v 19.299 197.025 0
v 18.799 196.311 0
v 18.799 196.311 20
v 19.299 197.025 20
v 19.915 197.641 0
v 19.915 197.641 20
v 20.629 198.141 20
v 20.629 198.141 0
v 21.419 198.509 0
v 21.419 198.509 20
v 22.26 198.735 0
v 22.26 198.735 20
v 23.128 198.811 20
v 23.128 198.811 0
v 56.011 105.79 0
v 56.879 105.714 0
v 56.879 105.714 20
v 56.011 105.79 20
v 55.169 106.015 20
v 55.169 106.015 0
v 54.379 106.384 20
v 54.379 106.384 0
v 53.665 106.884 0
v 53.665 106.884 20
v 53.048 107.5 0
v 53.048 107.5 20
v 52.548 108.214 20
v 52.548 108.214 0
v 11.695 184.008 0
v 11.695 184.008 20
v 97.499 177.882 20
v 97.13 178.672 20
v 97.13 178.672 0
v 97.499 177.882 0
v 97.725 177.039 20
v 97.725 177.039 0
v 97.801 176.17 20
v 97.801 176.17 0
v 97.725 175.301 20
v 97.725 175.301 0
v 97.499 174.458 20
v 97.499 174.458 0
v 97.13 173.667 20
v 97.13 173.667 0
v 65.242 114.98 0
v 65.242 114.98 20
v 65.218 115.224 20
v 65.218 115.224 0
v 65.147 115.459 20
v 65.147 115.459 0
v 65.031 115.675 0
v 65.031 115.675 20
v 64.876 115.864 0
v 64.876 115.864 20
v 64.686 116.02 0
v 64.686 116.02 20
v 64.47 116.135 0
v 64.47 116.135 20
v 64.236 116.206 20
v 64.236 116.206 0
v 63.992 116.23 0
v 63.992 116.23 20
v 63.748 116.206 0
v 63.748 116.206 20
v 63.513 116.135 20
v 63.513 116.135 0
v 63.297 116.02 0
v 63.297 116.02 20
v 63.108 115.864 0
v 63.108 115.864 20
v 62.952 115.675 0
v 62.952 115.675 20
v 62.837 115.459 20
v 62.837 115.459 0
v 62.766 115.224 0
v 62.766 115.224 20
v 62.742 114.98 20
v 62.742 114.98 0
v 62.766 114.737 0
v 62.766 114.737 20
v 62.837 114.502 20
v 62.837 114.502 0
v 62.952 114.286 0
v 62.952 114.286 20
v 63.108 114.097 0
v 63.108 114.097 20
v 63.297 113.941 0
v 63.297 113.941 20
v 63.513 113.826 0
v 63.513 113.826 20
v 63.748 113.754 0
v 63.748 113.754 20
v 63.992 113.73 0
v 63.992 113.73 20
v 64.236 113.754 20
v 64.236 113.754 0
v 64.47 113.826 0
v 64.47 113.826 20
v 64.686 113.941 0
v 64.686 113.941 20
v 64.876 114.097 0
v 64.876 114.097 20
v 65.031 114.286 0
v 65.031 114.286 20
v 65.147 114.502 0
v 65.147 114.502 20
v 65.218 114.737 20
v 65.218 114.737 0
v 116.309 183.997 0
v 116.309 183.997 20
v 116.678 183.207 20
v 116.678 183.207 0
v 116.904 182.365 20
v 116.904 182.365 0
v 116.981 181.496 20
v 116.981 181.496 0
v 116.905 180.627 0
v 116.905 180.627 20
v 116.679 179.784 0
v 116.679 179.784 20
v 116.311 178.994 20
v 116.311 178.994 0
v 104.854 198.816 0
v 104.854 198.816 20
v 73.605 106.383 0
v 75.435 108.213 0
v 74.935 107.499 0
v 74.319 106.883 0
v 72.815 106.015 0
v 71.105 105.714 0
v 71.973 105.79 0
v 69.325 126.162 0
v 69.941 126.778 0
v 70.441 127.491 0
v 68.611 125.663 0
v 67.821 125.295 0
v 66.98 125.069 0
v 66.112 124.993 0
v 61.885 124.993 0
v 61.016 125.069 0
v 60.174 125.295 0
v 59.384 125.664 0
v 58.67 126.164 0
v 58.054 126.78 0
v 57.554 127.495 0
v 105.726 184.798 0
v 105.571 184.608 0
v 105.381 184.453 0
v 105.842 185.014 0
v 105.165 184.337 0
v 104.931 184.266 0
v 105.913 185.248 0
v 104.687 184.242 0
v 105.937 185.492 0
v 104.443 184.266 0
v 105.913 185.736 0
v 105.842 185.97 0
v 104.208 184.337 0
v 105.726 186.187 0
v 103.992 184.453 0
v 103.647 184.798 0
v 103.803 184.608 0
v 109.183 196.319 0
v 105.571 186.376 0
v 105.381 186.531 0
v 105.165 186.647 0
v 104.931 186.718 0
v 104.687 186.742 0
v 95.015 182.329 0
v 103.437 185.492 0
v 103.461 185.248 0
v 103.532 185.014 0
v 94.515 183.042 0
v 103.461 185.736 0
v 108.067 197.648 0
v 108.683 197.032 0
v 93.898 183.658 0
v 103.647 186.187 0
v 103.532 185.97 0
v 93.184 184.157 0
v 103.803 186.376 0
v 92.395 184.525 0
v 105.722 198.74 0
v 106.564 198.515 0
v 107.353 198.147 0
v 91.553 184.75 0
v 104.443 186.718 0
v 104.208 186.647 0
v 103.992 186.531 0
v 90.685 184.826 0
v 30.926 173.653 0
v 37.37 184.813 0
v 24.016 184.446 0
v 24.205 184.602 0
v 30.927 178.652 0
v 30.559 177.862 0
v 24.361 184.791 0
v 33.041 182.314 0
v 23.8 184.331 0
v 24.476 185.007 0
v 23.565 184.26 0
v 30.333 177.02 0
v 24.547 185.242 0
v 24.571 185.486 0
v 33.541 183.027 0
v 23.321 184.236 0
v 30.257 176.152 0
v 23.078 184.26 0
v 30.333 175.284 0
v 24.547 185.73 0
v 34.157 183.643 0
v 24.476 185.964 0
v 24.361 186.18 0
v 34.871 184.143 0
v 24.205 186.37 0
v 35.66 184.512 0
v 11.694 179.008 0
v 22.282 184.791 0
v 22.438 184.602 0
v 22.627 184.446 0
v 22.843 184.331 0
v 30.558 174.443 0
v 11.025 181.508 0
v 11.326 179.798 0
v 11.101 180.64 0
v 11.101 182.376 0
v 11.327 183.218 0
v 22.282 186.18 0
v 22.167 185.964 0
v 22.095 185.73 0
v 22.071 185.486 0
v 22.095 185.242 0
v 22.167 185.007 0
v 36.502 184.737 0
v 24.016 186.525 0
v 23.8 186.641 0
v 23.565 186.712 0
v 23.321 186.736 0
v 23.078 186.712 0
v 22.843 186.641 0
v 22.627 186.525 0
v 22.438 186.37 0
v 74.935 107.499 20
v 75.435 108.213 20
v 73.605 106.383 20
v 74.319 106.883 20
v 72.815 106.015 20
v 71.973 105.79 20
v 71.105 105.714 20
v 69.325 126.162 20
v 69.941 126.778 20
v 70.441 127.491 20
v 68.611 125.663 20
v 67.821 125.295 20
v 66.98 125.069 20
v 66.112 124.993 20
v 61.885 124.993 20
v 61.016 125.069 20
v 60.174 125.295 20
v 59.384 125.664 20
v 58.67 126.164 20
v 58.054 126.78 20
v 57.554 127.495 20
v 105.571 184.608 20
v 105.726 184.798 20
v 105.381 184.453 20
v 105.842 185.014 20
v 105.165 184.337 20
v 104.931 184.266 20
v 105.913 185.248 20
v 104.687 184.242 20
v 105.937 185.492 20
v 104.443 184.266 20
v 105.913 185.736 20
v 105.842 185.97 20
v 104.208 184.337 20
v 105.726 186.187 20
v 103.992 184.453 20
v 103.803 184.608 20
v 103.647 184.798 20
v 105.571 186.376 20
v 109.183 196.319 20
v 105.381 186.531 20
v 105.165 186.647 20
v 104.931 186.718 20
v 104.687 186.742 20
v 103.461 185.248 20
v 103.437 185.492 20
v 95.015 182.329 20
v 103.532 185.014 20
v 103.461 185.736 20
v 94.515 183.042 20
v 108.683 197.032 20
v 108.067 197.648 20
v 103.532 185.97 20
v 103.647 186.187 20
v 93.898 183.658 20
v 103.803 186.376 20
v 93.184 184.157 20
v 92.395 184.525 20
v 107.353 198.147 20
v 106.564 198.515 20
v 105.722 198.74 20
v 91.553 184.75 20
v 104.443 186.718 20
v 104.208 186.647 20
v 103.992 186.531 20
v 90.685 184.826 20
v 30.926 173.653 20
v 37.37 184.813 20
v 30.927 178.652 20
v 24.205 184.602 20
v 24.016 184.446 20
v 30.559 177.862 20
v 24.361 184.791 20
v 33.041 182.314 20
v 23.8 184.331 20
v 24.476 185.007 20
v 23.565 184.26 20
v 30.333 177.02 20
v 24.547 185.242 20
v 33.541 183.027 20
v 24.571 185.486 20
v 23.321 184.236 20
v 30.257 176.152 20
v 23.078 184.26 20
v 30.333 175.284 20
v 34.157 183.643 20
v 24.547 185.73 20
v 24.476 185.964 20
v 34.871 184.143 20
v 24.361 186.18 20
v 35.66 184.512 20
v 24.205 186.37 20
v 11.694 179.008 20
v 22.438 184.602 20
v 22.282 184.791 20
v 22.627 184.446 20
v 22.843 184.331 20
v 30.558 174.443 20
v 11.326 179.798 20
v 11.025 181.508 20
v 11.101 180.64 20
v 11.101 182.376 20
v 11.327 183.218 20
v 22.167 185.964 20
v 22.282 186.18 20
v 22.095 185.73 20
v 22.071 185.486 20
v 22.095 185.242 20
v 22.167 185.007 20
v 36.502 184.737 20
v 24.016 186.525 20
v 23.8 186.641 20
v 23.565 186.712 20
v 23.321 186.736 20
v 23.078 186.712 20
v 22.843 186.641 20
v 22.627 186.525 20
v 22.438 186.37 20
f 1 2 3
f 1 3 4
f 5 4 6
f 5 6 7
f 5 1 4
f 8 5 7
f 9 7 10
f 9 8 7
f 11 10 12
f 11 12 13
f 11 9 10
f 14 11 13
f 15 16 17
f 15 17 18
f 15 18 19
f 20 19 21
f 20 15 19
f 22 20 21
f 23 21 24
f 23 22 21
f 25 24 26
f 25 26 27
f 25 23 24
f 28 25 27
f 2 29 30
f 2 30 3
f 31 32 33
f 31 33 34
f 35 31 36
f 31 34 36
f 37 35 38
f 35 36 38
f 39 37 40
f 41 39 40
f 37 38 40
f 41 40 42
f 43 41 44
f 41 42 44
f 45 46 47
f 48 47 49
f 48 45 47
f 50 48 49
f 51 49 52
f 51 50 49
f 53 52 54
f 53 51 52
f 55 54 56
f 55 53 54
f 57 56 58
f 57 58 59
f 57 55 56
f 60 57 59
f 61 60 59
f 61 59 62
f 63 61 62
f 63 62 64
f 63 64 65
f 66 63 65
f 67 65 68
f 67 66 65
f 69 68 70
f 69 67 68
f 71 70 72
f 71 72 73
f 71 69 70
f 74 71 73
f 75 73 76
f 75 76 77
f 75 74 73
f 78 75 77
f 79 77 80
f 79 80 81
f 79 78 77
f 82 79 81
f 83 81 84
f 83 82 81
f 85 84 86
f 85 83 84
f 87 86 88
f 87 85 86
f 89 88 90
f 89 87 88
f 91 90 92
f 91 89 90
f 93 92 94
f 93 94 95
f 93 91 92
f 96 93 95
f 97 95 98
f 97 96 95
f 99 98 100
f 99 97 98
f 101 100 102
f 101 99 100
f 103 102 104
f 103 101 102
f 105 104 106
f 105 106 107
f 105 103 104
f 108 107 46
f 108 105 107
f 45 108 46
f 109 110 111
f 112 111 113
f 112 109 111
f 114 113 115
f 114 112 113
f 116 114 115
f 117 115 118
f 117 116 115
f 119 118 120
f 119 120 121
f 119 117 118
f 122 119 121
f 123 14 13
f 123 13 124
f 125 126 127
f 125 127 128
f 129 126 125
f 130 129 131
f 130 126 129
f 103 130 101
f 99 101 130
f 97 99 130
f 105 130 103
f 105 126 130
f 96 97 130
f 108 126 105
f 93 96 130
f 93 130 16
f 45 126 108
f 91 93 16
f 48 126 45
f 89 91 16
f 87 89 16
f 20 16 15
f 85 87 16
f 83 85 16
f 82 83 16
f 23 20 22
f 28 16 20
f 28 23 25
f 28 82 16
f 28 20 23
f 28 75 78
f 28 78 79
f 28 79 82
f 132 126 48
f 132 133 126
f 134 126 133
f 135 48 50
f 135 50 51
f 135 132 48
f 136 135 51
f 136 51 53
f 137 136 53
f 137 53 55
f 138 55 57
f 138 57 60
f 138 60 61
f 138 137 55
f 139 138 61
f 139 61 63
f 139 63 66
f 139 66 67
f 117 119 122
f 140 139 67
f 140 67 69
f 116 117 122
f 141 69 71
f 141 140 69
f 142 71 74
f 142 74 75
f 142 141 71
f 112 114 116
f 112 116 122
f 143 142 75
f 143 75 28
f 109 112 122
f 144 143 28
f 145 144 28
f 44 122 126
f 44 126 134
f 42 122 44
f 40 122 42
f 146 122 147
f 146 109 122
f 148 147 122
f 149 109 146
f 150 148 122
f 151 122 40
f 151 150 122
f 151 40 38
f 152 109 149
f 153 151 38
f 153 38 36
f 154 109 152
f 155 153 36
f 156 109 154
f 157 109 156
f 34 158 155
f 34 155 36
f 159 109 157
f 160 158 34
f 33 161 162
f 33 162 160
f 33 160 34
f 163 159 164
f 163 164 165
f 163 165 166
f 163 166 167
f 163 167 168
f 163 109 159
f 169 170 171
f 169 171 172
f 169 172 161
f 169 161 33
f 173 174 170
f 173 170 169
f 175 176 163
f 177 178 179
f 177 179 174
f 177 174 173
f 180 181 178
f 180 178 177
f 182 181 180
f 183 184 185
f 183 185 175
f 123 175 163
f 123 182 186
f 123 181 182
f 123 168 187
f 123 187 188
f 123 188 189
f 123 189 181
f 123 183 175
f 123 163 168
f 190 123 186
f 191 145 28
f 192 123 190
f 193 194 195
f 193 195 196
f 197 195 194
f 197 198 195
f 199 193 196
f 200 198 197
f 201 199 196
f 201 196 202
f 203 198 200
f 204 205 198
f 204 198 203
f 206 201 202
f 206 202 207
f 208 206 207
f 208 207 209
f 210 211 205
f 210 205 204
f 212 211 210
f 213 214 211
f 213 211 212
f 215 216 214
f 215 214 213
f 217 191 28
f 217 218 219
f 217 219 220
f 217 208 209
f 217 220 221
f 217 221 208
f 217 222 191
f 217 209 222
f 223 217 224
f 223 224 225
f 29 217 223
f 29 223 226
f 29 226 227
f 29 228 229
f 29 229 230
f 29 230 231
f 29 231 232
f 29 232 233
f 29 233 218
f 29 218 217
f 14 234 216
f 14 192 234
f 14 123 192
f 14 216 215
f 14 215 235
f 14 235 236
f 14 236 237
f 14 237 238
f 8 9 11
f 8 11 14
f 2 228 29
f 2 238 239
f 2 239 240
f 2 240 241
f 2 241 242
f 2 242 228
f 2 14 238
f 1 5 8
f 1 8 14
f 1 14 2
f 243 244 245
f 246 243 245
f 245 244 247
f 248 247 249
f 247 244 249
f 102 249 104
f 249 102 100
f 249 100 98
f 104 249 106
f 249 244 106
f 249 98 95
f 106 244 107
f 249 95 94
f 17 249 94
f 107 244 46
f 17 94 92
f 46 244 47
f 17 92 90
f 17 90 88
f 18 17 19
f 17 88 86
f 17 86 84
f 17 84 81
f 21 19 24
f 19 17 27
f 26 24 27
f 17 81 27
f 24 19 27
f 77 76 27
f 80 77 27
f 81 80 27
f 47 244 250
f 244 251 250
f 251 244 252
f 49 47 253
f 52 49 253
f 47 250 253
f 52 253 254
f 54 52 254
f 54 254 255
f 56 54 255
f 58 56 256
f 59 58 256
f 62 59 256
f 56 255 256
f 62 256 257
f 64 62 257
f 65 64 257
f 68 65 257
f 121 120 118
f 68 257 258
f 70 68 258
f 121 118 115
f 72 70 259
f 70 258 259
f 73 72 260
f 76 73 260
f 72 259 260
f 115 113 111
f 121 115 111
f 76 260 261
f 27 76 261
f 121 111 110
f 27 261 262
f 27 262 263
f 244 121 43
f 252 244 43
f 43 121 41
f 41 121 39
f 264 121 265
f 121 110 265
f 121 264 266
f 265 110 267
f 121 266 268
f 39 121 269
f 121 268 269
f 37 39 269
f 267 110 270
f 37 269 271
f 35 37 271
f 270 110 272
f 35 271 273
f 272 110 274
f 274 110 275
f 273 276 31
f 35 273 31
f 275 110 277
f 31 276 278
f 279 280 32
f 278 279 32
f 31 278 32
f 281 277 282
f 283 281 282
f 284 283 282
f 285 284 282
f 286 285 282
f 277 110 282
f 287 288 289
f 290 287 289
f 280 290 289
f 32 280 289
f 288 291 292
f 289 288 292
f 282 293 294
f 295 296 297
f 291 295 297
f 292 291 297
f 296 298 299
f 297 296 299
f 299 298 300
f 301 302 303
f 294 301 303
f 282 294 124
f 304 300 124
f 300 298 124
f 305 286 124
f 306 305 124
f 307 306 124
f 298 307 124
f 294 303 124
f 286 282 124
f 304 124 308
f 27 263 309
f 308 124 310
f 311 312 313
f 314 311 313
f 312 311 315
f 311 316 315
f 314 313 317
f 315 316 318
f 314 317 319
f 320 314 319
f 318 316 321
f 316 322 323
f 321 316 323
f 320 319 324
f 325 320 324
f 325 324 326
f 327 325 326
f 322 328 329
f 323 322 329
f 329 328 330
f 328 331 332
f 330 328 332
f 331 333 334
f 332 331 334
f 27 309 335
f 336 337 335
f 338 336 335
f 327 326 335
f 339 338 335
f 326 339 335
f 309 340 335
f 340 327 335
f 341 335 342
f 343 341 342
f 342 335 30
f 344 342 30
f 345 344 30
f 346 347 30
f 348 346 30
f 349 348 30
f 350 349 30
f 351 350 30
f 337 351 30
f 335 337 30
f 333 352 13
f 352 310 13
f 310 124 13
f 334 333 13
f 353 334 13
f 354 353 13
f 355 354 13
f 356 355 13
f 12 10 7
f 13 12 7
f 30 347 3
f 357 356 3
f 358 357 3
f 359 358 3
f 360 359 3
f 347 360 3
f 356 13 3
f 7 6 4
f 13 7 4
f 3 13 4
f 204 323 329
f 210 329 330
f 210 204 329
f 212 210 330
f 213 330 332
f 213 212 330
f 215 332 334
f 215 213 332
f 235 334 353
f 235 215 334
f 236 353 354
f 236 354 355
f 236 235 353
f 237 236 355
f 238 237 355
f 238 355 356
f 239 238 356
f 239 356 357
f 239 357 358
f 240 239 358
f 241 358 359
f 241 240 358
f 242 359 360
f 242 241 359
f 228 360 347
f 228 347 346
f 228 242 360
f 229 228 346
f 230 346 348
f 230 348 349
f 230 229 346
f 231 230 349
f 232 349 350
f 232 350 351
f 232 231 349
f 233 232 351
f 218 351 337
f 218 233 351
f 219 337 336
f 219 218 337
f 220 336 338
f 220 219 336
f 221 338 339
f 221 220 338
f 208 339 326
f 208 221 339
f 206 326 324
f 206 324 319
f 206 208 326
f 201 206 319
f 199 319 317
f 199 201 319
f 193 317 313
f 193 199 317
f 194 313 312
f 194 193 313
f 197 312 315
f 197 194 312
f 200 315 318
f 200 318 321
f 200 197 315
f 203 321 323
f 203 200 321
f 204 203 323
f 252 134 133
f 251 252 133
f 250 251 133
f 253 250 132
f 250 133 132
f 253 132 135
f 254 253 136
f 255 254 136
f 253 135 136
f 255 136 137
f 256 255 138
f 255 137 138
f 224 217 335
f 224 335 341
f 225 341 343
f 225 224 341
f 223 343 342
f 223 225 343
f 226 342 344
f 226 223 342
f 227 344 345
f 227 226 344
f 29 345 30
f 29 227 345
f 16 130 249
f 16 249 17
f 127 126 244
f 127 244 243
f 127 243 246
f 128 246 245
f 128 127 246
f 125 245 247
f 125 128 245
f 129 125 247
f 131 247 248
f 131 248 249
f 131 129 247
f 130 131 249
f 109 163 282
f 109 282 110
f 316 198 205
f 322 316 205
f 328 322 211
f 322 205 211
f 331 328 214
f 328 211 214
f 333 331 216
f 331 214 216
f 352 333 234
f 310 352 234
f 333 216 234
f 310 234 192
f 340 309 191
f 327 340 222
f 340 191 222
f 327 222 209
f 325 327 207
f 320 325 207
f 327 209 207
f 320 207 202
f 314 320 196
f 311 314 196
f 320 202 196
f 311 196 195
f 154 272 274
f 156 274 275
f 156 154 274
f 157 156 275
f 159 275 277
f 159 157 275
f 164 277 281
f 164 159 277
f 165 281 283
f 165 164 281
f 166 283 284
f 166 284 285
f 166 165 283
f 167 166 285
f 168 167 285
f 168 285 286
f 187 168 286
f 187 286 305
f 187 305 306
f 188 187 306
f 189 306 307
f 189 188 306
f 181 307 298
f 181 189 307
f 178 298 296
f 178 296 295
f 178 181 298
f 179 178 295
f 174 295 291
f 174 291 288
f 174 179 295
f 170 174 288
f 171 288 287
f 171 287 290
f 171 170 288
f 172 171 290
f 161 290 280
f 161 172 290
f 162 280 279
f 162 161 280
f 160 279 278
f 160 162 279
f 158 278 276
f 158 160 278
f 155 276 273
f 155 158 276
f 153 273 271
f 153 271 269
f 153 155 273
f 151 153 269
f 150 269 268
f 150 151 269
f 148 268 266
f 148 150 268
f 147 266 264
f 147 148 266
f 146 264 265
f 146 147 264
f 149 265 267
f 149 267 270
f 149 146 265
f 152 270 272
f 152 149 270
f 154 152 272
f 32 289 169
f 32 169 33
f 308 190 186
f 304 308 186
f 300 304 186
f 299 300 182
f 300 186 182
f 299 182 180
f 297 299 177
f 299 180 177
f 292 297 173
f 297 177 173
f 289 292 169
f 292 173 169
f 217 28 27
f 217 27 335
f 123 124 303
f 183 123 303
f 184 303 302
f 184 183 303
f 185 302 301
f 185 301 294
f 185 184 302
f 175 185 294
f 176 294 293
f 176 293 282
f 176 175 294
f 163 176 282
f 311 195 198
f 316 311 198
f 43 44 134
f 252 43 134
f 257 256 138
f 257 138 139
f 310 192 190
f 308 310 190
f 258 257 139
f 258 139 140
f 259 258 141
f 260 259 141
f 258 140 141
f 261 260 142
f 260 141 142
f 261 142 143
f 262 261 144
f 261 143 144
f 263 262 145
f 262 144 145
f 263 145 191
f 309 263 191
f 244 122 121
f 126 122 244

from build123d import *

# Parameters (mm, degrees)
MODEL_R                  = 1.25
RESSALTO_EXTRUS_O1_DEPTH = 20


with BuildPart() as part:
    # Model → Ressalto-extrusão1 (new body)
    with BuildSketch(Plane.XY):
        with BuildLine():
            Line((11.694931393, 184.007671687), (18.798816999, 196.310732401))
            ThreePointArc((18.798816999, 196.310732401), (20.628779754, 198.140639612), (23.128489927, 198.81054493))
            Line((23.128489927, 198.81054493), (104.854461984, 198.816198006))
            ThreePointArc((104.854461984, 198.816198006), (107.353091528, 198.147315496), (109.183125054, 196.319330074))
            Line((109.183125054, 196.319330074), (116.309159239, 183.99727285))
            ThreePointArc((116.309159239, 183.99727285), (116.980841789, 181.495674545), (116.310694096, 178.993664633))
            Line((116.310694096, 178.993664633), (75.435169171, 108.213155276))
            ThreePointArc((75.435169171, 108.213155276), (73.605079007, 106.383366964), (71.105317099, 105.713631437))
            Line((71.105317099, 105.713631437), (56.87911326, 105.713631437))
            ThreePointArc((56.87911326, 105.713631437), (54.378684602, 106.383751932), (52.548491341, 108.214488825))
            Line((52.548491341, 108.214488825), (11.694328258, 179.008341616))
            ThreePointArc((11.694328258, 179.008341616), (11.024950213, 181.508087444), (11.694931393, 184.007671687))
        make_face()
        with Locations((23.321458454, 185.48579228)):
            Circle(MODEL_R, mode=Mode.SUBTRACT)
        with Locations((63.991701896, 114.980441868)):
            Circle(MODEL_R, mode=Mode.SUBTRACT)
        with Locations((104.686697162, 185.492130263)):
            Circle(MODEL_R, mode=Mode.SUBTRACT)
        with BuildLine():
            Line((30.926807018, 178.651666079), (33.041188625, 182.313516329))
            ThreePointArc((33.041188625, 182.313516329), (34.870788611, 184.143214068), (37.370023748, 184.813328729))
            Line((37.370023748, 184.813328729), (90.685321042, 184.825950173))
            ThreePointArc((90.685321042, 184.825950173), (93.184425519, 184.157277084), (95.014821917, 182.329082369))
            Line((95.014821917, 182.329082369), (97.129519324, 178.672431029))
            ThreePointArc((97.129519324, 178.672431029), (97.801202073, 176.169904784), (97.130125767, 173.667215847))
            Line((97.130125767, 173.667215847), (70.44074248, 127.491170956))
            ThreePointArc((70.44074248, 127.491170956), (68.610777042, 125.662525758), (66.111818822, 124.993254082))
            Line((66.111818822, 124.993254082), (61.884877937, 124.993254082))
            ThreePointArc((61.884877937, 124.993254082), (59.3841246, 125.66356209), (57.553881257, 127.494760984))
            Line((57.553881257, 127.494760984), (30.925829122, 173.652985522))
            ThreePointArc((30.925829122, 173.652985522), (30.256825897, 176.152456774), (30.926807018, 178.651666079))
        make_face(mode=Mode.SUBTRACT)
    extrude(amount=RESSALTO_EXTRUS_O1_DEPTH)


solid = part.part
